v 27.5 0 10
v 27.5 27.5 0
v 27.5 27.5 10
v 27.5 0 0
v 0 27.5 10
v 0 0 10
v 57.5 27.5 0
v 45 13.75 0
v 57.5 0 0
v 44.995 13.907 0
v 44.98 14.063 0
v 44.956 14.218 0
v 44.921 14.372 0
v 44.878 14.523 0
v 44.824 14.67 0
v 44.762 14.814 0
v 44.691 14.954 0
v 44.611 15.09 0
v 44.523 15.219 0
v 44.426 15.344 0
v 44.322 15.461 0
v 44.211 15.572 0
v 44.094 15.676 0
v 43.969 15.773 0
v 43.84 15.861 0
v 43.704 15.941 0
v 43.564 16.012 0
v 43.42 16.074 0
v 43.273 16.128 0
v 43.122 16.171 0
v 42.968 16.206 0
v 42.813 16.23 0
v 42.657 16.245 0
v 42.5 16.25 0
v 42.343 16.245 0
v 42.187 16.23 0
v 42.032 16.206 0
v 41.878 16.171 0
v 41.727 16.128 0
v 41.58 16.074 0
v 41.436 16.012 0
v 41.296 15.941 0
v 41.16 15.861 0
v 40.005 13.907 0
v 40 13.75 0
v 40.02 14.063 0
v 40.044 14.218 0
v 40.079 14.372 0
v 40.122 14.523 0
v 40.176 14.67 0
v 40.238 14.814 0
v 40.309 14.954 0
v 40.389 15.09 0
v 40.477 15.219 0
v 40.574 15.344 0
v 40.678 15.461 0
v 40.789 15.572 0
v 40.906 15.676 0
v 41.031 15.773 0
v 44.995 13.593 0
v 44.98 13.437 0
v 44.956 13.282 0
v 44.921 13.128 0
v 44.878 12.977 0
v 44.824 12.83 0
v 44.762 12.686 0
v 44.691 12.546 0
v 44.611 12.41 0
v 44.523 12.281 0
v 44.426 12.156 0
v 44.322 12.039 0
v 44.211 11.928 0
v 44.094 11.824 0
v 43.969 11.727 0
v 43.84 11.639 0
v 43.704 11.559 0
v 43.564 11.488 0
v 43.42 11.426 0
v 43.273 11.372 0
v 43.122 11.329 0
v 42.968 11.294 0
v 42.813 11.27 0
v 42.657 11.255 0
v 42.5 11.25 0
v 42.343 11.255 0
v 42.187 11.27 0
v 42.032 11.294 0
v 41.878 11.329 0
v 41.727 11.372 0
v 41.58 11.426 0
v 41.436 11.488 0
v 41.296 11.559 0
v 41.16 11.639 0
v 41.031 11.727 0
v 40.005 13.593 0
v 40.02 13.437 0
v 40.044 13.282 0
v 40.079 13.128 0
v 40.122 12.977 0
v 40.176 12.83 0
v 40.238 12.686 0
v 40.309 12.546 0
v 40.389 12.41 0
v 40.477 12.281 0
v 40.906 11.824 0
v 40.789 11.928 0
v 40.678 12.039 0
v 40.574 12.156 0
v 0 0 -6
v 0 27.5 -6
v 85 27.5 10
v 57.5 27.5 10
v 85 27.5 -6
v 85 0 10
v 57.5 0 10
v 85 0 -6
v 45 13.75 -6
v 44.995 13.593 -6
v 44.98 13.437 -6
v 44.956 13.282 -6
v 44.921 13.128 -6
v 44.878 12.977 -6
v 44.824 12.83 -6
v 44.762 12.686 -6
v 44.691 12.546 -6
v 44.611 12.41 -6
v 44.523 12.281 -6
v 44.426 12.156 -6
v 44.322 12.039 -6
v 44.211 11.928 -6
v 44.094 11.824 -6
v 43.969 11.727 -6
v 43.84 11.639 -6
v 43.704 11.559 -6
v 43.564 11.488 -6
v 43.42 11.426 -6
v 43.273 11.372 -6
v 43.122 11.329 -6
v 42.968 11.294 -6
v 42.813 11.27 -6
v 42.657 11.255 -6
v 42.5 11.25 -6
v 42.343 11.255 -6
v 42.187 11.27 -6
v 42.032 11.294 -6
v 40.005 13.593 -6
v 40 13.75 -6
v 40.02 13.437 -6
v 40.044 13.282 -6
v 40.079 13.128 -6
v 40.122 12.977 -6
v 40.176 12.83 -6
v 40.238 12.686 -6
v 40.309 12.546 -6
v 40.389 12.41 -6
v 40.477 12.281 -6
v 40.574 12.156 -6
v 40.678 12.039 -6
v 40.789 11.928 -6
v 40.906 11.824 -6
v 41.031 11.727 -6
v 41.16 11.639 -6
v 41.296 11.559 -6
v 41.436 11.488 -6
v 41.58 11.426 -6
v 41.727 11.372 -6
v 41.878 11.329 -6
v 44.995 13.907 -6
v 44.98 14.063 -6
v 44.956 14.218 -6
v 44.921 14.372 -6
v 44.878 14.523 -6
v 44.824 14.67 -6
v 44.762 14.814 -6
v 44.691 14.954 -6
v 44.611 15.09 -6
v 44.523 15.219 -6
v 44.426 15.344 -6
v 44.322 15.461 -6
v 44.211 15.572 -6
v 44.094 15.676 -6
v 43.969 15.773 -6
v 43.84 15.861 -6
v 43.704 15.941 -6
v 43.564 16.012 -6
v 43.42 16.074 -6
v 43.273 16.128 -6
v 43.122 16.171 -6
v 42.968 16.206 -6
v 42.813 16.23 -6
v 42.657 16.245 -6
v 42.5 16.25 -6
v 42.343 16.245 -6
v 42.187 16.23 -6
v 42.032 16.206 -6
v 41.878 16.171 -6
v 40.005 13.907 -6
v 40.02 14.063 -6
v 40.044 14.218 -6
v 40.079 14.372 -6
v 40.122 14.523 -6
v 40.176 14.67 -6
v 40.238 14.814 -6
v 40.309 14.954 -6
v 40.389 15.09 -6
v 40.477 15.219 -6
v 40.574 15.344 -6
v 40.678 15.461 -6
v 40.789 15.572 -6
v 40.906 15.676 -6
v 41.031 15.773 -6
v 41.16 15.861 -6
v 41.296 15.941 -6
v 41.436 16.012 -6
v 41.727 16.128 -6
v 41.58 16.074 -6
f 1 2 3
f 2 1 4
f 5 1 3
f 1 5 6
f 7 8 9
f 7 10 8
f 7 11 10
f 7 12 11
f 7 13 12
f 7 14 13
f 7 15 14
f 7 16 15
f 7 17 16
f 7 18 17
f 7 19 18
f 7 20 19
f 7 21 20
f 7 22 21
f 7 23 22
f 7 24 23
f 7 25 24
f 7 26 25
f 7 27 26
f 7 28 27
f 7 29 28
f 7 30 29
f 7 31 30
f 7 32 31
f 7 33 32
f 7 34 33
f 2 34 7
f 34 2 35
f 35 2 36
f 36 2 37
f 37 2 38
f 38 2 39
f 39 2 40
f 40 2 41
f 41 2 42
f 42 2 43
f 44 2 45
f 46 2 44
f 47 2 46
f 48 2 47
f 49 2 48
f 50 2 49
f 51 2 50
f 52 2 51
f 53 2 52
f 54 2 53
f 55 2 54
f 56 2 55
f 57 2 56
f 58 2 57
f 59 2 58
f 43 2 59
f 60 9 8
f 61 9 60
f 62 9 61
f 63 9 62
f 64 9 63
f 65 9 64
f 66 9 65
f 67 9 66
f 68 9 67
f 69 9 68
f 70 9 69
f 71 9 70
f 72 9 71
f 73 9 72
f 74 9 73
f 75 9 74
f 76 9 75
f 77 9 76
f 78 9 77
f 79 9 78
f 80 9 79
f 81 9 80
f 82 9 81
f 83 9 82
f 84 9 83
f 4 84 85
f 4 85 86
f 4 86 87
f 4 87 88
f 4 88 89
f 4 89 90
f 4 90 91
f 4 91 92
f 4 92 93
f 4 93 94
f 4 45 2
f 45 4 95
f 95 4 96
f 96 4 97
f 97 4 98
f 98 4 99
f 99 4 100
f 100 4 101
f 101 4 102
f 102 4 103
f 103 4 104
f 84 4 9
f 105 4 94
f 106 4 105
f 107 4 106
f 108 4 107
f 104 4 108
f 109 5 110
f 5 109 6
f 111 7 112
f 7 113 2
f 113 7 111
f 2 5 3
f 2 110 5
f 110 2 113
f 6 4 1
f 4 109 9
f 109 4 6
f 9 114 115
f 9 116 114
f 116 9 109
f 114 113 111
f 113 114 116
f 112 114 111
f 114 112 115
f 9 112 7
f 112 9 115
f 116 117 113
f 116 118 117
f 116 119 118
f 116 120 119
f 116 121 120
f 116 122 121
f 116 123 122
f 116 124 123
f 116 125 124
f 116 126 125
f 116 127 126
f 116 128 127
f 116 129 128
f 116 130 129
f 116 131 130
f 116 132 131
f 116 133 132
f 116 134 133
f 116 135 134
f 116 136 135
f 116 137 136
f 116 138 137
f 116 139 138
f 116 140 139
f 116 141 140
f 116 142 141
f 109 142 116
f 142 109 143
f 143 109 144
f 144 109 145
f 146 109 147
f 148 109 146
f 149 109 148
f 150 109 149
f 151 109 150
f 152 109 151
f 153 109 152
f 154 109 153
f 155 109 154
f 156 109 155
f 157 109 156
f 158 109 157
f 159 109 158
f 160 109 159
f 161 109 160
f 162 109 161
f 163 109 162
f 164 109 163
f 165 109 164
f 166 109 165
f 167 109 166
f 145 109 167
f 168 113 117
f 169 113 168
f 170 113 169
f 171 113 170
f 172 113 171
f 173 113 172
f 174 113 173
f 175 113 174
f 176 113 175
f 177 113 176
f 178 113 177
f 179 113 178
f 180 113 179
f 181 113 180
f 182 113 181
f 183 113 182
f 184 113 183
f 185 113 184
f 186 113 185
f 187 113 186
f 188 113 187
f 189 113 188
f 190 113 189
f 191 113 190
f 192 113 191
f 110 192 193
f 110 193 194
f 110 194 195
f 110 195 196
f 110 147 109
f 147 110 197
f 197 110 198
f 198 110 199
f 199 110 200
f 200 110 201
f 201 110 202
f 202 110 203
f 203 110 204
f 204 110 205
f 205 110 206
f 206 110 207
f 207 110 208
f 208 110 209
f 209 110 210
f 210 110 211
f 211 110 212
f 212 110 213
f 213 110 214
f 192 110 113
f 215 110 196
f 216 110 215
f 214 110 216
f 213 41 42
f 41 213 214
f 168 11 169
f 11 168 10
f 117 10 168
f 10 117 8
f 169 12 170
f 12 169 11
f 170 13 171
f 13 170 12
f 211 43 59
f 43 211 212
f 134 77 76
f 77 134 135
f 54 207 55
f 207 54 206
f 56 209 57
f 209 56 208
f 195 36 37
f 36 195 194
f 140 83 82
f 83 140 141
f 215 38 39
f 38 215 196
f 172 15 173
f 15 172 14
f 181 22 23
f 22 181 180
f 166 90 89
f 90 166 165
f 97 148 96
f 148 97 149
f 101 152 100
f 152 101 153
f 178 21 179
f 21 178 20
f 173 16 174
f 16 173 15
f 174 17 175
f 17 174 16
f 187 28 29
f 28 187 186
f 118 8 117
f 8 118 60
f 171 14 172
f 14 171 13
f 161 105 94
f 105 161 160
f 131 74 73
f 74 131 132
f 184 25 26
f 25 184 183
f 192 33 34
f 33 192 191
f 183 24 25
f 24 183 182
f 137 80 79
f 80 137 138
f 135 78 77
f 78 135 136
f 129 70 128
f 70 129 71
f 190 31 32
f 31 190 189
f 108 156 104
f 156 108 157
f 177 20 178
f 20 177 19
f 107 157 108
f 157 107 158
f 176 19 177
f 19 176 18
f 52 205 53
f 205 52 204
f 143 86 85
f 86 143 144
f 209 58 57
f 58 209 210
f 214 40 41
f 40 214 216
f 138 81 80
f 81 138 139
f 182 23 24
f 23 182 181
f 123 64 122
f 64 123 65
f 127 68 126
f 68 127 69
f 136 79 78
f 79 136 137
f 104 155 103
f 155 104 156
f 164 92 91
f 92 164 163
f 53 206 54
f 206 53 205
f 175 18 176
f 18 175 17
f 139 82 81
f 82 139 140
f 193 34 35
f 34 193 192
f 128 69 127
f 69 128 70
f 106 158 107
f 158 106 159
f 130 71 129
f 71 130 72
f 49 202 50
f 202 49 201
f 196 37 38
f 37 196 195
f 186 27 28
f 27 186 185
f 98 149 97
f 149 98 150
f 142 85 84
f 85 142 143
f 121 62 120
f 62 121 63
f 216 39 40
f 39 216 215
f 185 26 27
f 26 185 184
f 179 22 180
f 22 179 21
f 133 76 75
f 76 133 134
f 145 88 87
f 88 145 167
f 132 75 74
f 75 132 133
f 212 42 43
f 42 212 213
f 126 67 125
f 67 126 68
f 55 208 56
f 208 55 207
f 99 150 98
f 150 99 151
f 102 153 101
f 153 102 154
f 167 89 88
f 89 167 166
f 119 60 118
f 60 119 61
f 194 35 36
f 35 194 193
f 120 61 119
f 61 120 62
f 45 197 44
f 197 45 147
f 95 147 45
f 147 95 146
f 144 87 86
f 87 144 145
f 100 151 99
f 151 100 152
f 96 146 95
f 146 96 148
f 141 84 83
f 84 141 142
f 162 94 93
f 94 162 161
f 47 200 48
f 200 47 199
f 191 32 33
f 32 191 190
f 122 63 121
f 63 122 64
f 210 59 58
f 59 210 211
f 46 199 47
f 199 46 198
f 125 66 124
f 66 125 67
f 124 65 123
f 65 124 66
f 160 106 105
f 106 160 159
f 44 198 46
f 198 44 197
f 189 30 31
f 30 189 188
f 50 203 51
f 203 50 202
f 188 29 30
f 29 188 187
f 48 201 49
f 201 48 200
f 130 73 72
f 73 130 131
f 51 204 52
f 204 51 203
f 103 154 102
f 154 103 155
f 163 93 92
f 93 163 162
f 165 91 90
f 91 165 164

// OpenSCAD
/*
Description : the J-brace purpose; 
    a) to hold rubber in place.
    b) anchor for trough-spacer.

NOTE: slicer is not slicing wall 1mm thick. removing -3*BRACE_THICKNESS from height,
since first increment will not appear in g-code.
UPDATE: While above is true the shorter thicker model came out better.
*/

/*****************************************************************************
CONSTANTS
*****************************************************************************/
$fn=100;
PI = 4 * atan2(1,1);

WALL_HEIGHT = 216;
FLOOR_WIDTH = 85;
TRUSS_HEIGHT = 80;
BRACE_WIDTH = 30;
BRACE_THICKNESS = 6;
TRIANGLE = [[0,0],[0,1],[1,0]];

/*****************************************************************************
FUNCTIONS - code to make reading modules easier to understand.
******************************************************************************/
function half(x) = x/2;
function wedgeIncrement(height,i) = i * half(height)/(BRACE_THICKNESS)+half(height);

/*****************************************************************************
Directives - defines what to build with optional features.
*****************************************************************************/
INCLUDE_THING = 0;
BUILD_JBRACE = 0;
BUILD_LONG_RULER_STAND = 0;
BUILD_JBRACE_FLOOR_SPACER = 1;

/*****************************************************************************
MAIN SUB - where the instructions start.
*****************************************************************************/
build();

/*****************************************************************************
MODULES: - the meat of the project.
*****************************************************************************/
module build()
{
    if(BUILD_JBRACE) J_Brace();
    if(BUILD_LONG_RULER_STAND) longRulerStand(20,10,3.5,6);
    if(BUILD_JBRACE_FLOOR_SPACER)
        J_BraceFloorSpacer(10, half(FLOOR_WIDTH-BRACE_WIDTH), BRACE_WIDTH, BRACE_THICKNESS);
    
}
module J_BraceFloorSpacer(spacerHeight, spacerWidth, J_BraceWidth, spacerThickness) 
{
    echo(spacerHeight=spacerHeight, spacerWidth=spacerWidth, J_BraceWidth=J_BraceWidth, spacerThickness=spacerThickness);

difference()
    {
        union()
        {
            cube(size=[spacerWidth, spacerWidth, spacerHeight]);

            translate([spacerWidth + J_BraceWidth, 0, 0]) 
            {
                cube(size=[spacerWidth, spacerWidth, spacerHeight]);    
            }

            translate([0,0,-spacerThickness])
            cube(size=[2*spacerWidth + J_BraceWidth, spacerWidth, spacerThickness]);  
        }      

        //screw hole for spacer.
        translate([half(2*spacerWidth + J_BraceWidth), half(spacerWidth), 0]) 
        rotate([0, 0, 0]) 
        cylinder(h = 100,d = 5, $fn=100, center = true);
    }
}

module longRulerStand(braceHeight,braceWidth,rulerWidth,standThickness)
{
    translate([(braceHeight + rulerWidth), 0, 0]) 
    {
        triangle90(braceHeight,braceHeight,braceWidth);    
    }
    
    translate([braceHeight, 0, 0]) 
    {
        rotate([0,0,90])
        triangle90(braceHeight,braceHeight,braceWidth);    
    }

    // translate([0,0,-half(braceWidth)])
    rotate([90, 0, 0]) 
    cube(size=[(2*braceHeight)+rulerWidth, braceWidth, standThickness]);
}

module J_Brace() {
    
    difference()
    {
        union()
        {
            staggaredWall(height = WALL_HEIGHT-3*BRACE_THICKNESS);
            linear_extrude(BRACE_WIDTH)
            {
                {
                    //floor
                    color("LightCyan")
                    translate([1.8*BRACE_THICKNESS, 0, 0]) 
                    // rotate([0, 0, 5]) 
                    square(size=[(FLOOR_WIDTH-BRACE_THICKNESS),BRACE_THICKNESS]);

                    //truss side
                    color("PaleTurquoise") 
                    translate([FLOOR_WIDTH, 0, 0])     
                    rotate([0, 0, -5]) 
                    {
                        square(size=[BRACE_THICKNESS,TRUSS_HEIGHT]);
                    }
                }
            }

            color("Turquoise") 
            translate([2*BRACE_THICKNESS-0.7, 2*BRACE_THICKNESS, 0]) 
            rotate([0, 0, 180]) 
            rotate_extrude(angle = 90)
            translate([BRACE_THICKNESS, 0, 0]) 
            {
                square(size=[BRACE_THICKNESS, BRACE_WIDTH]);
            }            
        }
        
        //screw hole for spacer.
        translate([half(FLOOR_WIDTH), 0, half(BRACE_WIDTH)]) 
        rotate([90, 0, 0]) 
        cylinder(h = 100,d = 5, $fn=100, center = true);

        //screw hole for truss
        translate([FLOOR_WIDTH, half(TRUSS_HEIGHT), half(BRACE_WIDTH)]) 
        rotate([0, 90, 0]) 
        cylinder(h = 100,d = 5, $fn=100, center = true);
    }
}

module staggaredWall(height=WALL_HEIGHT)
{
    echo(str("height = ", height));
    translate([BRACE_THICKNESS+0.3, 1.8* BRACE_THICKNESS, BRACE_WIDTH]) 
    rotate([0, 180, 5]) 
    linear_extrude(BRACE_WIDTH)
    {
        for (i=[1:(BRACE_THICKNESS)]) {
            echo(str("wedgeIncrement(i)=", wedgeIncrement(height,i)));
            translate([i, 0, 0]) 
            square(size=[1,wedgeIncrement(height,i)], center = false);
        }        
    }    
}

module triangle90(width,height,depth) 
{
    linear_extrude(depth)
    scale([width, height, 0]) 
    {
        polygon(points=[[0,0],[1,0],[0,1]]);
    }
}
